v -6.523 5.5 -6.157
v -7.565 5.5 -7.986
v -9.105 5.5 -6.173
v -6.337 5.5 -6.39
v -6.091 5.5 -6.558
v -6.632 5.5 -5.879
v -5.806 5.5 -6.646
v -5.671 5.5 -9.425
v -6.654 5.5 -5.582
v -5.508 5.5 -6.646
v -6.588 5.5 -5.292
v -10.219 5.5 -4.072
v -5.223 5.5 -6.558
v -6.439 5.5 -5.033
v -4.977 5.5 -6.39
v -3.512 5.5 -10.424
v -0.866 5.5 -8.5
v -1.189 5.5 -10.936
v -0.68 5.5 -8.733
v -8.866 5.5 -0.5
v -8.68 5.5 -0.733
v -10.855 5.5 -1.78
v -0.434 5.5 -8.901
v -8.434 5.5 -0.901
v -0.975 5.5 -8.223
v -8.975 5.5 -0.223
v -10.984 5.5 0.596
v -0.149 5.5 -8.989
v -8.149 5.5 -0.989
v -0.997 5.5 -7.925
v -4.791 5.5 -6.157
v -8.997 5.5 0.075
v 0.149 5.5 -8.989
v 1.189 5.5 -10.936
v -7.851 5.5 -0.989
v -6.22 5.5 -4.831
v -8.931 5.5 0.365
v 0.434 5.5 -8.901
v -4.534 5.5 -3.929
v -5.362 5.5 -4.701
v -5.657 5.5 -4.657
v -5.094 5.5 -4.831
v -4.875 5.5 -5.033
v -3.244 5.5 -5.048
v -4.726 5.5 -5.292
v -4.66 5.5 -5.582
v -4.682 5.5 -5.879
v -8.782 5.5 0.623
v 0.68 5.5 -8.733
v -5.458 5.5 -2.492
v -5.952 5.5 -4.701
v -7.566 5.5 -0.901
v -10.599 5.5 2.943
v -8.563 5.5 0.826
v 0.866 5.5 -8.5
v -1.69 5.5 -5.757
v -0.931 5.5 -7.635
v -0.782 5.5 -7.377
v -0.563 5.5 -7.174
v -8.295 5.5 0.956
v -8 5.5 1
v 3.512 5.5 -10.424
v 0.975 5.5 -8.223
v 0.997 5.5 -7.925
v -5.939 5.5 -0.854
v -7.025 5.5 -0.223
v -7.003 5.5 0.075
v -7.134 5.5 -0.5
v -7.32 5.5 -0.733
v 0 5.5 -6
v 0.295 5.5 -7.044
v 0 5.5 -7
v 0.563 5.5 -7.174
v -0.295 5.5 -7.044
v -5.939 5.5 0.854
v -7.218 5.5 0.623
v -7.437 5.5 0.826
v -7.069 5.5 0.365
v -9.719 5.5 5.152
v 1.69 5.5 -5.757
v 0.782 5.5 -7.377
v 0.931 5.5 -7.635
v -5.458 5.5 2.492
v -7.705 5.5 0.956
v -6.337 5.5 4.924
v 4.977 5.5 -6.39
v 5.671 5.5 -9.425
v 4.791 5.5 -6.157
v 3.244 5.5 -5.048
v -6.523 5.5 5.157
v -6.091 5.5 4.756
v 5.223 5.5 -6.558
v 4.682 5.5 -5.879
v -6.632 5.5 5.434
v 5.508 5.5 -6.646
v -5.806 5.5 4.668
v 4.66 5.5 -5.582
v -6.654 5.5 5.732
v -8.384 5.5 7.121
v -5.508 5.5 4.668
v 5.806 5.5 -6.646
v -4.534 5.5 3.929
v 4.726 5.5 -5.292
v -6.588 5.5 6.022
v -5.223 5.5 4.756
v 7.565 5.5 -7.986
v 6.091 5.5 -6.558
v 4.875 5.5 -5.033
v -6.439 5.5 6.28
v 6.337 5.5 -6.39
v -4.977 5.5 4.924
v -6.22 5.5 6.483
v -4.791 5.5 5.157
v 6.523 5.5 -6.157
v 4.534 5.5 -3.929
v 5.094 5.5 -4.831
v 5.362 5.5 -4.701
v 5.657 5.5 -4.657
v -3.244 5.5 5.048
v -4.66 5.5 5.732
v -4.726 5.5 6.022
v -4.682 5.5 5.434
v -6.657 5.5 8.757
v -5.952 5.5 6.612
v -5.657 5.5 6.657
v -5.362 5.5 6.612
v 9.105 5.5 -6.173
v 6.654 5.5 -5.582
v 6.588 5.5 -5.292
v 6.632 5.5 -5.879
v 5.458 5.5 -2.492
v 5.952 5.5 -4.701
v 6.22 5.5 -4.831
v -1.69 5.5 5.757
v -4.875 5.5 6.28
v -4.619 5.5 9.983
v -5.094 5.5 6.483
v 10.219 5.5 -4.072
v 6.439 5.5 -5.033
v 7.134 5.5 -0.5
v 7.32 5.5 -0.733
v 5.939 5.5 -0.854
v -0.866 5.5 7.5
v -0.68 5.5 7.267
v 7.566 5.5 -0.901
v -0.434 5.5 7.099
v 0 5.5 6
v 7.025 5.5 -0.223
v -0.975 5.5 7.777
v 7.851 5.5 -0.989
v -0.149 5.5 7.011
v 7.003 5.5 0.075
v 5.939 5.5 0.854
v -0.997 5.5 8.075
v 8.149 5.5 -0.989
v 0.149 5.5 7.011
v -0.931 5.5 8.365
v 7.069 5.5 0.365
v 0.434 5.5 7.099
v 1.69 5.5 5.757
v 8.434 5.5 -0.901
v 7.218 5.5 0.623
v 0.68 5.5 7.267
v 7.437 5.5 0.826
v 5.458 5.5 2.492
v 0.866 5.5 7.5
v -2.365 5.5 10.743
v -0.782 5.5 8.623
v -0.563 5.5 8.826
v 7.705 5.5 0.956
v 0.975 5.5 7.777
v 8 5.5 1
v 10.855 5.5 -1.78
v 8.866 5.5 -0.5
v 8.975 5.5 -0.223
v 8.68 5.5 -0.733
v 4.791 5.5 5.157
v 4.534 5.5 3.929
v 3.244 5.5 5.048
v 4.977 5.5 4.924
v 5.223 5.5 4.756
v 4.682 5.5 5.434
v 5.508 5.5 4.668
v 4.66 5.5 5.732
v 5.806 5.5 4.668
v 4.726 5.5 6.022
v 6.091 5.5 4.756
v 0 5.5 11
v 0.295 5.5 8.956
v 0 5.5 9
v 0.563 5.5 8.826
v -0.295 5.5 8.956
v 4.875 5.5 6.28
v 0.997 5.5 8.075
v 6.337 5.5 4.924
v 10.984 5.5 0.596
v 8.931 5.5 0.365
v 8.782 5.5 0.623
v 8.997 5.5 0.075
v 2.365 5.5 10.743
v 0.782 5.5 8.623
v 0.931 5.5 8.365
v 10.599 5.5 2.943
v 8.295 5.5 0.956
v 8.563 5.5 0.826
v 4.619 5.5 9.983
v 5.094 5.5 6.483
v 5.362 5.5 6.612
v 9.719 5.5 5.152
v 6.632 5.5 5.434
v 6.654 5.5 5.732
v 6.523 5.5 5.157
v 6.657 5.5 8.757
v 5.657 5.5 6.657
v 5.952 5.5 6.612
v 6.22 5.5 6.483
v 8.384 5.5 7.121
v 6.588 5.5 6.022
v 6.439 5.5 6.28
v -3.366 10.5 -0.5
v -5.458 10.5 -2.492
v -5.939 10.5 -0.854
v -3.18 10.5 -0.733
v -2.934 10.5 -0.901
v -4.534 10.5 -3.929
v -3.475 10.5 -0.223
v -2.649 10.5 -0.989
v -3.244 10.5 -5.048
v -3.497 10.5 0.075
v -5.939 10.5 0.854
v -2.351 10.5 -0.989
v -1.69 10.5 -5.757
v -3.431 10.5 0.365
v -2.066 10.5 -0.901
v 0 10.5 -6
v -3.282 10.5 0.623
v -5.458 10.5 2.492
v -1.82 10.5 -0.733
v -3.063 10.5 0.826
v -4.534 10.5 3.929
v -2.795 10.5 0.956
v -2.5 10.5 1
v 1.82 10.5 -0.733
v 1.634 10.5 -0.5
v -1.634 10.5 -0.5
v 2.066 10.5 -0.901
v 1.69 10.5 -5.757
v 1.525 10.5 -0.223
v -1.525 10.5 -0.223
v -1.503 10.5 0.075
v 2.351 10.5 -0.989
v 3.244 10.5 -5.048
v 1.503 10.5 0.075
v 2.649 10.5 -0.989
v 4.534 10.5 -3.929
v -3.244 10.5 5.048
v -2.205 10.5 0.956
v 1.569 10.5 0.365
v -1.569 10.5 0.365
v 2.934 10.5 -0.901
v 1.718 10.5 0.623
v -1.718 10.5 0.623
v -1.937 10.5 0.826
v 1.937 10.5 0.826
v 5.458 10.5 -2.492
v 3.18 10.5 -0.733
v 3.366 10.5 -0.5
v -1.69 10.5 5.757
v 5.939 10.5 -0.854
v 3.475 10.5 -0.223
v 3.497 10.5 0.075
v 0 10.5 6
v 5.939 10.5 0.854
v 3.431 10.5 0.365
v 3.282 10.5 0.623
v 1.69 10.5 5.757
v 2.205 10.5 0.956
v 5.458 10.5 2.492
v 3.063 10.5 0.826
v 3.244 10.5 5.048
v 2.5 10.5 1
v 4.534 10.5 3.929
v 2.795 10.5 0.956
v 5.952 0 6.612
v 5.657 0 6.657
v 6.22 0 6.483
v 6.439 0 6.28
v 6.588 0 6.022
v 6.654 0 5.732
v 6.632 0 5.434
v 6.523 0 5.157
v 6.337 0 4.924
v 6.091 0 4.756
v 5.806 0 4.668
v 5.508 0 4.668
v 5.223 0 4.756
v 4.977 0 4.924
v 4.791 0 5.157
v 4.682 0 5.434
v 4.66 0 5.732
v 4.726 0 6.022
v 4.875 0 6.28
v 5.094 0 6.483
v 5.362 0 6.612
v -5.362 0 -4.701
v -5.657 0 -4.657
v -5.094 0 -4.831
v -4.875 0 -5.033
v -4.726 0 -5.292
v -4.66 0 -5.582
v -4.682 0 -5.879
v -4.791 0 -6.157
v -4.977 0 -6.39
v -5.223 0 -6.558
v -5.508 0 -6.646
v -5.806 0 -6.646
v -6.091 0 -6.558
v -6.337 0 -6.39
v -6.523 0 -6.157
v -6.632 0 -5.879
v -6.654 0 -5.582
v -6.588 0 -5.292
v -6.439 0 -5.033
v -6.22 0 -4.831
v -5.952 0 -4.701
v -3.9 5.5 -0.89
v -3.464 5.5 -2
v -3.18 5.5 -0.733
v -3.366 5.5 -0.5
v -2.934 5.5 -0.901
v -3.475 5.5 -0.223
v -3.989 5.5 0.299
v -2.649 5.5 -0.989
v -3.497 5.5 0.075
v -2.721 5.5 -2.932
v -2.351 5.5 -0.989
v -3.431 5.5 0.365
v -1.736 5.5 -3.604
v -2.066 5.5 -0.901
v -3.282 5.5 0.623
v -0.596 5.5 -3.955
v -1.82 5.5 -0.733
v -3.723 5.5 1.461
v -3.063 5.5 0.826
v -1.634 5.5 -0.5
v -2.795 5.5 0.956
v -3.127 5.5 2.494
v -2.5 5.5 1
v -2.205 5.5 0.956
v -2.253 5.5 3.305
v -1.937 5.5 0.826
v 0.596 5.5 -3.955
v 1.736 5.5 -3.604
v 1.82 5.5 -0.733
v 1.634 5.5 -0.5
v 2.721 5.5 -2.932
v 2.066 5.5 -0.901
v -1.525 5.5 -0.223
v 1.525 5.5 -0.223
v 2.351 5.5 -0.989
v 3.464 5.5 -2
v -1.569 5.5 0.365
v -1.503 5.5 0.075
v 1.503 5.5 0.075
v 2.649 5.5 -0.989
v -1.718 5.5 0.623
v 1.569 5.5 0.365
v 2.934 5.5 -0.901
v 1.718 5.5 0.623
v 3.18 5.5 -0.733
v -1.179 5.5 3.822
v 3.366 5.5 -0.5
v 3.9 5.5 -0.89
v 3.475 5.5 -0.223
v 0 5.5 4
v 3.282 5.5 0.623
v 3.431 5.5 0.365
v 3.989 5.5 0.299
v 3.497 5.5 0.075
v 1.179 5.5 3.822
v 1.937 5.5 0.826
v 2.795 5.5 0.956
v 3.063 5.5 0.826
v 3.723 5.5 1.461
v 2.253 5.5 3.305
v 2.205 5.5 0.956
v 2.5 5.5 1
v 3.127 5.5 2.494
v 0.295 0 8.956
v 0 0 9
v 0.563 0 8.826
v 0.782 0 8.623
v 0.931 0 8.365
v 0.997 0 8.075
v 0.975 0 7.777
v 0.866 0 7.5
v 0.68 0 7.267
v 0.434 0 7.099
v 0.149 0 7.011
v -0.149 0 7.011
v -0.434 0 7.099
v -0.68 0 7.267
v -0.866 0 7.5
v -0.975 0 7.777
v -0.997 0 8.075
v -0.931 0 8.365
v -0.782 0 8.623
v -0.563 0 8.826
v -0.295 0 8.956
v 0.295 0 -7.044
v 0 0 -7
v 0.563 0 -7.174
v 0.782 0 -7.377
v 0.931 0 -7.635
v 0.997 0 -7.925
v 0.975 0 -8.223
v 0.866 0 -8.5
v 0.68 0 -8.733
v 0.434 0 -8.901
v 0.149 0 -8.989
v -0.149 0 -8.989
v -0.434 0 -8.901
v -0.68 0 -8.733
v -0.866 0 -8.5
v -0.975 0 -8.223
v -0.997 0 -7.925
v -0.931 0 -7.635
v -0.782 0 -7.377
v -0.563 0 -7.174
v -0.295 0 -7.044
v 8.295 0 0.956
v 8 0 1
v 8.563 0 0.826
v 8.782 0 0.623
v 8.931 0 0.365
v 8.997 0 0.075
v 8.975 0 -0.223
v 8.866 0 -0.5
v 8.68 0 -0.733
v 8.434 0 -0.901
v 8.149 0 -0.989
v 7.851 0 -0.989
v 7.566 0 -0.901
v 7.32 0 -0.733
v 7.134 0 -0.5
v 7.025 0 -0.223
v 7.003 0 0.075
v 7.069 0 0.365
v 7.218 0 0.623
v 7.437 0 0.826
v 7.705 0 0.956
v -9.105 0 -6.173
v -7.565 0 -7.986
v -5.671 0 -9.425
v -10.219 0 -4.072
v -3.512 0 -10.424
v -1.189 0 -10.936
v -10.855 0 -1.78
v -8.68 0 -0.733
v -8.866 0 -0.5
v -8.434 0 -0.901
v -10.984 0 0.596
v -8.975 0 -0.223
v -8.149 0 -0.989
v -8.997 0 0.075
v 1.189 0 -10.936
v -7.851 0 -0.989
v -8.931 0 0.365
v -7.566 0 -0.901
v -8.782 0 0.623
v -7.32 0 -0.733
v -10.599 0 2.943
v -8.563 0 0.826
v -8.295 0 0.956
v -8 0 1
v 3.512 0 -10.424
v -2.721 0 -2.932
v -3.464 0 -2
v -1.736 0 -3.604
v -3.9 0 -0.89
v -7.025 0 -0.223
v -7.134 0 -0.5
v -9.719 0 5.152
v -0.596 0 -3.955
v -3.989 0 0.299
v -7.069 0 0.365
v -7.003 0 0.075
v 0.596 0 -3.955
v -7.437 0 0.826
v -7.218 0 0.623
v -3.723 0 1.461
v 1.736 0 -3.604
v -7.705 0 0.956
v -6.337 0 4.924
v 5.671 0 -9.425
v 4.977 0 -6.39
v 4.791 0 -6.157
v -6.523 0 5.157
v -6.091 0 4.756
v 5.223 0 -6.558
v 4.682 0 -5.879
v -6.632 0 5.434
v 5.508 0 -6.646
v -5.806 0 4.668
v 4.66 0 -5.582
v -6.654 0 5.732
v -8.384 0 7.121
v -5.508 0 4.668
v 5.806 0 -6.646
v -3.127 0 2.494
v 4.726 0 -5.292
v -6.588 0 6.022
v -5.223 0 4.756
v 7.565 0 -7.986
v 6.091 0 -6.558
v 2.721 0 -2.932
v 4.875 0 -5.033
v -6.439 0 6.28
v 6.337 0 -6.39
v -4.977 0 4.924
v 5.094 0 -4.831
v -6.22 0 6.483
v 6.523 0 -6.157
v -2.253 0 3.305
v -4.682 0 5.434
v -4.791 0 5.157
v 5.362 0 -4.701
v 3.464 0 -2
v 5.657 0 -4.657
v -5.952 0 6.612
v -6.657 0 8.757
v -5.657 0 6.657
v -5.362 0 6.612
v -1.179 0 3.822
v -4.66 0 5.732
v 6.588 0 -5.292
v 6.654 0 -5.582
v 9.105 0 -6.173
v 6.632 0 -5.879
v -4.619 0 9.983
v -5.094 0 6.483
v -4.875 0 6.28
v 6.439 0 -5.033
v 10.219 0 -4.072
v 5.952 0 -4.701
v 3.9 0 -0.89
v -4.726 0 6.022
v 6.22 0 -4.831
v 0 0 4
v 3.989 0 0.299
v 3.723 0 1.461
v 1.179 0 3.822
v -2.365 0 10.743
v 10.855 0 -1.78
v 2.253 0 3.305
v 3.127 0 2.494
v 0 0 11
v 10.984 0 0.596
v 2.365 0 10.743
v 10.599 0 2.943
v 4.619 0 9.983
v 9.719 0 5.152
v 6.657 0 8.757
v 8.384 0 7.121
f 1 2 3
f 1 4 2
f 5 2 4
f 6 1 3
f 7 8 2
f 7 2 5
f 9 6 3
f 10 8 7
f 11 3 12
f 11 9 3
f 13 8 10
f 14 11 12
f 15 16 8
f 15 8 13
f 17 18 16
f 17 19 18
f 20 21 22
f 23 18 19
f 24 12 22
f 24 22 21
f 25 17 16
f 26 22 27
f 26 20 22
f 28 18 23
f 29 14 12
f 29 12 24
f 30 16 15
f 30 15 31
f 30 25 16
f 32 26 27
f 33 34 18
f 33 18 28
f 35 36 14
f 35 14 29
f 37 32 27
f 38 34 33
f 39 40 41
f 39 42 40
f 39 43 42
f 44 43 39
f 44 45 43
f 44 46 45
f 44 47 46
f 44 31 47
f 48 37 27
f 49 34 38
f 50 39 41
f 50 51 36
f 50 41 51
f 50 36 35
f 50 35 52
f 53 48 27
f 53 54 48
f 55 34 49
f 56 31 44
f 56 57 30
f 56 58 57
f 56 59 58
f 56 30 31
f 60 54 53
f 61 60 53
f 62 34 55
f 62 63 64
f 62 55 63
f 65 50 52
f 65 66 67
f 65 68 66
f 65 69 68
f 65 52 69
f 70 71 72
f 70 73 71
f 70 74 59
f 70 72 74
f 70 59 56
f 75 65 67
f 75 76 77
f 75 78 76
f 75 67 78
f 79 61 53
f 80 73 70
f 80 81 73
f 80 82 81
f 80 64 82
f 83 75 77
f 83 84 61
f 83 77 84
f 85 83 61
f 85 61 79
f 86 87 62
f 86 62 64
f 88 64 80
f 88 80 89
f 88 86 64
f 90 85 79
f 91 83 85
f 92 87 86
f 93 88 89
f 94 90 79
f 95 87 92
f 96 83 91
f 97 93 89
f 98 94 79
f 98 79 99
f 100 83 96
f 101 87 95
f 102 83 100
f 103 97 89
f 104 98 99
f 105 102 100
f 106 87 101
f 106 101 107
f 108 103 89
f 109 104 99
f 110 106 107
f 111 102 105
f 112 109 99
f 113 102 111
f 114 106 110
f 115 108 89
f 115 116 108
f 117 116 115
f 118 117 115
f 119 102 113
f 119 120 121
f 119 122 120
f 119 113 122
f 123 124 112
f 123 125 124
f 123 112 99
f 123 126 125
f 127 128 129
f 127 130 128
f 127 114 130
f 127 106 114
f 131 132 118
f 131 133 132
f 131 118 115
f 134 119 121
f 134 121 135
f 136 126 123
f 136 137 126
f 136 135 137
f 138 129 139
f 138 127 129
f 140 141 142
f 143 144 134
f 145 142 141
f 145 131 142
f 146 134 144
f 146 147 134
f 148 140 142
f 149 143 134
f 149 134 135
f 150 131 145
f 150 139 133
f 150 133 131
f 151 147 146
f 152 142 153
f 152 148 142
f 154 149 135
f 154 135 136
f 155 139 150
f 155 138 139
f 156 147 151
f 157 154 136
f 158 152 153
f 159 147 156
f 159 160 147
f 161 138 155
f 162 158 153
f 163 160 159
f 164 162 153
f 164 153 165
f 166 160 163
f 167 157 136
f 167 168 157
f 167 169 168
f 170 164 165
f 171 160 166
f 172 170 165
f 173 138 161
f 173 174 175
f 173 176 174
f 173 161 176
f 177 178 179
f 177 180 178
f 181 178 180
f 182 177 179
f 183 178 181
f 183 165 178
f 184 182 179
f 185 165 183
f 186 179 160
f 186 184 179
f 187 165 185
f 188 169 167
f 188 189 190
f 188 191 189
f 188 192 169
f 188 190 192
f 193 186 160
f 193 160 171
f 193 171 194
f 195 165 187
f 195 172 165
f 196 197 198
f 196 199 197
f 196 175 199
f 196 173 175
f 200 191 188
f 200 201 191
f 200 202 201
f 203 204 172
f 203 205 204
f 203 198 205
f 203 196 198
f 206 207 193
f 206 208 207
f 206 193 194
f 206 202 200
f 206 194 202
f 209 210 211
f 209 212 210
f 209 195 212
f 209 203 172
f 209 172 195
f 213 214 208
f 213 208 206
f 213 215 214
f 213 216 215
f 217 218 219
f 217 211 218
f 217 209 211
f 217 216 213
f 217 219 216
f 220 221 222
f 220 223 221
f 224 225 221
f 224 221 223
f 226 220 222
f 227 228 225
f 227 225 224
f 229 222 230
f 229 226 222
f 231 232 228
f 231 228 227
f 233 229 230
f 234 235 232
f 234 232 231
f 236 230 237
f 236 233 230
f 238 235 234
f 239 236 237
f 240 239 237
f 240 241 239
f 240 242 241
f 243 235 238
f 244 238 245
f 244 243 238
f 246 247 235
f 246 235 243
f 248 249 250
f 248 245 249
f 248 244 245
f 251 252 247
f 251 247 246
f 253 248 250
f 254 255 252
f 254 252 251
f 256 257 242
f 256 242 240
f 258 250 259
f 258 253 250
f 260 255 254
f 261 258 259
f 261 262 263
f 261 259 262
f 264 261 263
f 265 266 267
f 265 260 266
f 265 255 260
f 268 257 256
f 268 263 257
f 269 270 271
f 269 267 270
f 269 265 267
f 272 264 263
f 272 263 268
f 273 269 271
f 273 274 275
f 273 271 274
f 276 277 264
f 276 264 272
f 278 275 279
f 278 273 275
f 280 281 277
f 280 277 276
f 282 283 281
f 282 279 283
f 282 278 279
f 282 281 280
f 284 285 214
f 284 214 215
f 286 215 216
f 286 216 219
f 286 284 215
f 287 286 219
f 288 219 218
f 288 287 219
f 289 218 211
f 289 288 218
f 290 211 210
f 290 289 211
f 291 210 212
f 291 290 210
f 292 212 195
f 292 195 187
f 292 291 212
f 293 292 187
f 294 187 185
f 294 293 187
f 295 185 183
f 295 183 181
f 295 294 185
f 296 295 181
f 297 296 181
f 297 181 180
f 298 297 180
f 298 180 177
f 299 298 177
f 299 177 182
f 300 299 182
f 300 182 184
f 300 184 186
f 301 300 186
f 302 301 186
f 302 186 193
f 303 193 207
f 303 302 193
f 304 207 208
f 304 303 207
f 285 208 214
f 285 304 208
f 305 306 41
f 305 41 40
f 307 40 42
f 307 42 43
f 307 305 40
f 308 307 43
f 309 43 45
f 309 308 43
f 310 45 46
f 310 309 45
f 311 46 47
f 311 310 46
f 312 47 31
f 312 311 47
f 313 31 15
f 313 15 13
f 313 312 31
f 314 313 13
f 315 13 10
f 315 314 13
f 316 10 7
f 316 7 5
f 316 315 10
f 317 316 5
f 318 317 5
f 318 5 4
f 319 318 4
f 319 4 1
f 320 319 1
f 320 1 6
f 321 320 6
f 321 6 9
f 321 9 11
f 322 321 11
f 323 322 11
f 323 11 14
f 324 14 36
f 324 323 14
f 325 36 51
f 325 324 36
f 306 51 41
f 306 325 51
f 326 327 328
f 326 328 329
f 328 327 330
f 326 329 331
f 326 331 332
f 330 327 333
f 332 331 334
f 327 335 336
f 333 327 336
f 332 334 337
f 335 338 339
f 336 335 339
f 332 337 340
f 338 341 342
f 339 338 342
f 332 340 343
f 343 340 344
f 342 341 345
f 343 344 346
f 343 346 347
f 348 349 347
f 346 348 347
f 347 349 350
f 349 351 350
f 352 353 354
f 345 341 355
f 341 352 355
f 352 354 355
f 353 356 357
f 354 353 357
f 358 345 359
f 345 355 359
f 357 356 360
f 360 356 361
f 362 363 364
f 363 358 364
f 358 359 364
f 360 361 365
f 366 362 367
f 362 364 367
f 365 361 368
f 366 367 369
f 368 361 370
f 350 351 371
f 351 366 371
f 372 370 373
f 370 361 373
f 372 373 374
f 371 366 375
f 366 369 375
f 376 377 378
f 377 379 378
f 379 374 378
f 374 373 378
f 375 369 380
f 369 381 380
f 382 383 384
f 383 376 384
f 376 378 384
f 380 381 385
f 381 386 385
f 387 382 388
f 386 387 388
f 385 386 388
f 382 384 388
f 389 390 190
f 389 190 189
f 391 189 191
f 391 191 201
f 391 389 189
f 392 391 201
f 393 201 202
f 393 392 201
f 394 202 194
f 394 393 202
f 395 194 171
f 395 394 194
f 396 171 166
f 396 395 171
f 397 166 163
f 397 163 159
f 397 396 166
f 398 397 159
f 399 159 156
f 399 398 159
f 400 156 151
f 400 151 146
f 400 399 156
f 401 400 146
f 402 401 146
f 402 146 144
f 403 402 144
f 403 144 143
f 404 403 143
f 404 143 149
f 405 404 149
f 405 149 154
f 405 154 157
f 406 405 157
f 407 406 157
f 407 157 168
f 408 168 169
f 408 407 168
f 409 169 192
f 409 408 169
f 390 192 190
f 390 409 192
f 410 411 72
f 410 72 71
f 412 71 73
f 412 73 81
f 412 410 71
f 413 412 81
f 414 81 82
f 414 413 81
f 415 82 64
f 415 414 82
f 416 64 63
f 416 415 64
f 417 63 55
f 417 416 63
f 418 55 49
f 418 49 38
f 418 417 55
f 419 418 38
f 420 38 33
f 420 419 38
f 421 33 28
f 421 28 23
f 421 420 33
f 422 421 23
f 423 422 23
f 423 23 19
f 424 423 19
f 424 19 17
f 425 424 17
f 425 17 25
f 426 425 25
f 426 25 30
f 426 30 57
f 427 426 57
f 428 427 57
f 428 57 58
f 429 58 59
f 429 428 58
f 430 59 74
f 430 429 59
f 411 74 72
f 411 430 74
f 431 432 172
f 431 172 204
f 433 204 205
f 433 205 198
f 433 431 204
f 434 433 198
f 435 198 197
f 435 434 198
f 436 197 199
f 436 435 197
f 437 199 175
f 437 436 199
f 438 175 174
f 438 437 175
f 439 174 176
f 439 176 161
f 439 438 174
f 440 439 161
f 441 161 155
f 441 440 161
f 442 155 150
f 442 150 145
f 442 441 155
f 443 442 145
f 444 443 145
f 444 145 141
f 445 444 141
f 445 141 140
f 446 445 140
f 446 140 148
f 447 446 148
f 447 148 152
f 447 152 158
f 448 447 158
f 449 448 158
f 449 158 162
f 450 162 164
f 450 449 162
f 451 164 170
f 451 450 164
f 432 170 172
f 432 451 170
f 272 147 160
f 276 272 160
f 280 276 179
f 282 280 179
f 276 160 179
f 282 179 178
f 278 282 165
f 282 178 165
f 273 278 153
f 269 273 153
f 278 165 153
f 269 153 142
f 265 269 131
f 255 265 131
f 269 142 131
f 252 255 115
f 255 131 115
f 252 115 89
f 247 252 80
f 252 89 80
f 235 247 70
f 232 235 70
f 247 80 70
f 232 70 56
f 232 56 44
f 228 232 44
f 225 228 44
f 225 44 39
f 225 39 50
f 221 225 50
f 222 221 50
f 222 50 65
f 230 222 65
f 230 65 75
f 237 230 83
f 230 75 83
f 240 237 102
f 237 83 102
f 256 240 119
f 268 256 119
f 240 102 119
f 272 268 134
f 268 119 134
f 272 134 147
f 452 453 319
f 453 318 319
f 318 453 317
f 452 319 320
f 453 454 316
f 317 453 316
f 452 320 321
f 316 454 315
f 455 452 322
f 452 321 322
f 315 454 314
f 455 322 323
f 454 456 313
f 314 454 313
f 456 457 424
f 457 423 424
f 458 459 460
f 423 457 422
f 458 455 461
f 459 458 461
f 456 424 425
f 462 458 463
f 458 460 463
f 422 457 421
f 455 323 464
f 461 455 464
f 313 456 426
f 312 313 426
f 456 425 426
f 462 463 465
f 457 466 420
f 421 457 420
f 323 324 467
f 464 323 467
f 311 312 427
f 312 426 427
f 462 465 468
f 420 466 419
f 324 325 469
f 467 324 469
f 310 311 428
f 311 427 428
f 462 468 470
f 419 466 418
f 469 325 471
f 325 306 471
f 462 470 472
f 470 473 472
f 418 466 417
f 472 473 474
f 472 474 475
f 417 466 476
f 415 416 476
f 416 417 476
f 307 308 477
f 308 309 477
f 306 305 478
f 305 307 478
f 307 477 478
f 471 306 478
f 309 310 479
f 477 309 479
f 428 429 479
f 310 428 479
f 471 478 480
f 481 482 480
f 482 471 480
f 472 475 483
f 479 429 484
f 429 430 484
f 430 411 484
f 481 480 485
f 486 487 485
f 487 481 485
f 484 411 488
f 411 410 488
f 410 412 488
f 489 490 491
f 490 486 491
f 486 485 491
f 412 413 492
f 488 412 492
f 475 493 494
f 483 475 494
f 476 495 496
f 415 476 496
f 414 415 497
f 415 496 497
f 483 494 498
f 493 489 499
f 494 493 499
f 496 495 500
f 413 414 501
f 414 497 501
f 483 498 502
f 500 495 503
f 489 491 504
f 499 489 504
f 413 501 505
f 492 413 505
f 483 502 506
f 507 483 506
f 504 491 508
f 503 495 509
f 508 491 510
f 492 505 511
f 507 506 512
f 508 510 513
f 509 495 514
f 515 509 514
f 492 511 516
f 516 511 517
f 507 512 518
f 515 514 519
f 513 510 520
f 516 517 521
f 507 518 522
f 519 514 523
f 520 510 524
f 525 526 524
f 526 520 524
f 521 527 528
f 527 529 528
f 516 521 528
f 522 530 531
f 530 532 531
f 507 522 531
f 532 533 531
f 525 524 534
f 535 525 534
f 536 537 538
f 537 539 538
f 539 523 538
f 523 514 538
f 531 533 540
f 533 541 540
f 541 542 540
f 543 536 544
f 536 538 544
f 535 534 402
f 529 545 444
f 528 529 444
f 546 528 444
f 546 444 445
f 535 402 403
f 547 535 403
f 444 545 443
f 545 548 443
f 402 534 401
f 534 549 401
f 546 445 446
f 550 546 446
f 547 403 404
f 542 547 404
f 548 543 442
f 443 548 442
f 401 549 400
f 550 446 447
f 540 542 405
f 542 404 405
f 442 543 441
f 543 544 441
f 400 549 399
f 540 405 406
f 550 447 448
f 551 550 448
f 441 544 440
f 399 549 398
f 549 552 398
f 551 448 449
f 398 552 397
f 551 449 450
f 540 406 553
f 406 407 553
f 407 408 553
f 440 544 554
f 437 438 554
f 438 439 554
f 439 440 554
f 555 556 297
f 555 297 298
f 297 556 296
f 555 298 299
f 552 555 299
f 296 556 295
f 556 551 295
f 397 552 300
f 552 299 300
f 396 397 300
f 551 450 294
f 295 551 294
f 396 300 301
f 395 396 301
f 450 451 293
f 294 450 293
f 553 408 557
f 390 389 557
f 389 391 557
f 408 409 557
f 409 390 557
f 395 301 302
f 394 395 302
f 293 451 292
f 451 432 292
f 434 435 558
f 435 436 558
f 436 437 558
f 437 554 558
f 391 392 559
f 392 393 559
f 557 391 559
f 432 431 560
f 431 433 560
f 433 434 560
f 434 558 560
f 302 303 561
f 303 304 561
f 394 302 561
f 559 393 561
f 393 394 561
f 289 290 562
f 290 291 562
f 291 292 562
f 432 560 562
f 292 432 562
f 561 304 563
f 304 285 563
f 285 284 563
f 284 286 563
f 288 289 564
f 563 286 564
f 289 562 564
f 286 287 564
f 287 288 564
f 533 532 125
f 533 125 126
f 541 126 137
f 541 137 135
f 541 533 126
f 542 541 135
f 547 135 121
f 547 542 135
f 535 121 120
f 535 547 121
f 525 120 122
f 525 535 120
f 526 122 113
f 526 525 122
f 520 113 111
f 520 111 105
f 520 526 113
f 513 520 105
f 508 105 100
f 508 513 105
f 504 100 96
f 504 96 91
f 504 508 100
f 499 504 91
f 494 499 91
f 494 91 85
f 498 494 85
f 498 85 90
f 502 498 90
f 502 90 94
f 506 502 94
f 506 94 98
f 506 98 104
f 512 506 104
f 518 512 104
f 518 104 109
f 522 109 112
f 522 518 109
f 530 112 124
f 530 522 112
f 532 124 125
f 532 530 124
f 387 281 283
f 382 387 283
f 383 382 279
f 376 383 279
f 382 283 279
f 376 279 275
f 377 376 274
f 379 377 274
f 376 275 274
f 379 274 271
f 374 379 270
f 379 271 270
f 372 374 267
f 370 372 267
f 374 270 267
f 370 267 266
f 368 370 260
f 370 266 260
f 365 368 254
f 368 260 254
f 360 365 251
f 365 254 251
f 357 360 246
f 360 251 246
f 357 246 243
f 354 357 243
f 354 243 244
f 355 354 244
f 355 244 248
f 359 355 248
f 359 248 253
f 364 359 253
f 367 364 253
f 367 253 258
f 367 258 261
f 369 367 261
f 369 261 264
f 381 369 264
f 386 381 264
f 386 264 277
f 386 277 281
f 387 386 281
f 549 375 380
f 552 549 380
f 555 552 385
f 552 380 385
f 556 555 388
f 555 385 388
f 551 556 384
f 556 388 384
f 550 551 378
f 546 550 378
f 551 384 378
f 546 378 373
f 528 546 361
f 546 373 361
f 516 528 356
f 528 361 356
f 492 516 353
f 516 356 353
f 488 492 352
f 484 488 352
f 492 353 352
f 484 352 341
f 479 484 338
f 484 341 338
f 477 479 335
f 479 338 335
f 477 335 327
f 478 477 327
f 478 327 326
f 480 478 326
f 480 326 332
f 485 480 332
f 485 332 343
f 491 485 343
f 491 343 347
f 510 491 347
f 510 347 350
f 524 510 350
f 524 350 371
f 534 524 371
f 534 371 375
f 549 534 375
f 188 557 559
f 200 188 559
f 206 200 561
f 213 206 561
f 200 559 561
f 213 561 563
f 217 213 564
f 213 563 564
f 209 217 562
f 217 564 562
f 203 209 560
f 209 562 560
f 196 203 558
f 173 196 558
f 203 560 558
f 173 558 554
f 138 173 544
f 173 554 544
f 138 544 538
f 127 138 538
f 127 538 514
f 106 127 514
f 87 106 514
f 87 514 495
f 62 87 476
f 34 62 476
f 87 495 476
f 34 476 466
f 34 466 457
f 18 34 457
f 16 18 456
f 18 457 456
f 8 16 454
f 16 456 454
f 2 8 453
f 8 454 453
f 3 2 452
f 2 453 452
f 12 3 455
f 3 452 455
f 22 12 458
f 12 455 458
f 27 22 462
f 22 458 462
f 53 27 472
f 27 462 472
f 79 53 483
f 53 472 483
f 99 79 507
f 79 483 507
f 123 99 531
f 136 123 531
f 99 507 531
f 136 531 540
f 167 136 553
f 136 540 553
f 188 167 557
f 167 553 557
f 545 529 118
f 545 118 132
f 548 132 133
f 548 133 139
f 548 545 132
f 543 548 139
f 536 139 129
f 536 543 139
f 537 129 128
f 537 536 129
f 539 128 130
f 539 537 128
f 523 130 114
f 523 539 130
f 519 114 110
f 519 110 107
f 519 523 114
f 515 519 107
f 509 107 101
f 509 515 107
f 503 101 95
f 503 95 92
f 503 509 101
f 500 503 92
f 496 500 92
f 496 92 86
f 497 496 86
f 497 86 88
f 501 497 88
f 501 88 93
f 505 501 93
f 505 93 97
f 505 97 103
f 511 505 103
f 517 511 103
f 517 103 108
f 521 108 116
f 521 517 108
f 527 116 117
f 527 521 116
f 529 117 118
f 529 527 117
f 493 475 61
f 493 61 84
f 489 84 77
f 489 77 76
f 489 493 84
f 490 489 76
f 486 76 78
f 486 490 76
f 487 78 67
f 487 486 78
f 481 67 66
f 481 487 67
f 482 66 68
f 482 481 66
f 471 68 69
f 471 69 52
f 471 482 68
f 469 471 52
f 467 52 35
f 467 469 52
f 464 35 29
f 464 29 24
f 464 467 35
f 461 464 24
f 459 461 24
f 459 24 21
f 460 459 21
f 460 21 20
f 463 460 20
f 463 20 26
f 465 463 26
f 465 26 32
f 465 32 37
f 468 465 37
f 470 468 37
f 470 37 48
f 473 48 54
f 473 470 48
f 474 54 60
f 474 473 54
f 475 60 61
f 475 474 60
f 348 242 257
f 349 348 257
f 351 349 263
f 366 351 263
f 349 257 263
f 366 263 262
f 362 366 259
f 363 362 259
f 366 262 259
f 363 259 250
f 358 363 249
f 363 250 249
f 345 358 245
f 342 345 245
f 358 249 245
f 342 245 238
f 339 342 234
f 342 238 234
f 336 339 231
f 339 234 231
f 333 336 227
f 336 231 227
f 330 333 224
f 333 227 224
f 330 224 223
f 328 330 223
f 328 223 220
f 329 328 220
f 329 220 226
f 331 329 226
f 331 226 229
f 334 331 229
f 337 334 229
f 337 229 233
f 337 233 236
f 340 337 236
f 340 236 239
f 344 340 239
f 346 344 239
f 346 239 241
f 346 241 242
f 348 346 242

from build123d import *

# Parameters (mm, degrees)
SKETCH1_R           = 11
SKETCH1_R_2         = 1
BOSS_EXTRUDE1_DEPTH = 5.5
SKETCH2_R           = 4
CUT_EXTRUDE1_DEPTH  = 17.5
SKETCH9_R           = 6
BOSS_EXTRUDE4_DEPTH = 5
SKETCH10_R          = 1
CUT_EXTRUDE6_DEPTH  = 19.768324379


with BuildPart() as part:
    # Sketch1 → Boss-Extrude1 (new body)
    with BuildSketch(Plane(origin=(0, 0, 0), x_dir=(1, 0, 0), z_dir=(0, 1, 0))):
        Circle(SKETCH1_R)
        with Locations((0, 8)):
            Circle(SKETCH1_R_2, mode=Mode.SUBTRACT)
        with Locations((5.656854249, 5.656854249)):
            Circle(SKETCH1_R_2, mode=Mode.SUBTRACT)
        with Locations((8, 0)):
            Circle(SKETCH1_R_2, mode=Mode.SUBTRACT)
        with Locations((5.656854249, -5.656854249)):
            Circle(SKETCH1_R_2, mode=Mode.SUBTRACT)
        with Locations((0, -8)):
            Circle(SKETCH1_R_2, mode=Mode.SUBTRACT)
        with Locations((-5.656854249, -5.656854249)):
            Circle(SKETCH1_R_2, mode=Mode.SUBTRACT)
        with Locations((-8, 0)):
            Circle(SKETCH1_R_2, mode=Mode.SUBTRACT)
        with Locations((-5.656854249, 5.656854249)):
            Circle(SKETCH1_R_2, mode=Mode.SUBTRACT)
    extrude(amount=BOSS_EXTRUDE1_DEPTH)

    # Sketch2 → Cut-Extrude1 (cut, through all)
    with BuildSketch(Plane(origin=(0, 5.5, 0), x_dir=(1, 0, 0), z_dir=(0, 1, 0))):
        Circle(SKETCH2_R)
    extrude(amount=-CUT_EXTRUDE1_DEPTH, mode=Mode.SUBTRACT)

    # Sketch9 → Boss-Extrude4 (add)
    with BuildSketch(Plane(origin=(0, 5.5, 0), x_dir=(1, 0, 0), z_dir=(0, 1, 0))):
        Circle(SKETCH9_R)
    extrude(amount=BOSS_EXTRUDE4_DEPTH)

    # Sketch10 → Cut-Extrude6 (cut, through all)
    with BuildSketch(Plane(origin=(0, 10.5, 0), x_dir=(1, 0, 0), z_dir=(0, 1, 0))):
        with Locations((-2.5, 0)):
            Circle(SKETCH10_R)
        with Locations((2.5, 0)):
            Circle(SKETCH10_R)
    extrude(amount=-CUT_EXTRUDE6_DEPTH, mode=Mode.SUBTRACT)


solid = part.part
